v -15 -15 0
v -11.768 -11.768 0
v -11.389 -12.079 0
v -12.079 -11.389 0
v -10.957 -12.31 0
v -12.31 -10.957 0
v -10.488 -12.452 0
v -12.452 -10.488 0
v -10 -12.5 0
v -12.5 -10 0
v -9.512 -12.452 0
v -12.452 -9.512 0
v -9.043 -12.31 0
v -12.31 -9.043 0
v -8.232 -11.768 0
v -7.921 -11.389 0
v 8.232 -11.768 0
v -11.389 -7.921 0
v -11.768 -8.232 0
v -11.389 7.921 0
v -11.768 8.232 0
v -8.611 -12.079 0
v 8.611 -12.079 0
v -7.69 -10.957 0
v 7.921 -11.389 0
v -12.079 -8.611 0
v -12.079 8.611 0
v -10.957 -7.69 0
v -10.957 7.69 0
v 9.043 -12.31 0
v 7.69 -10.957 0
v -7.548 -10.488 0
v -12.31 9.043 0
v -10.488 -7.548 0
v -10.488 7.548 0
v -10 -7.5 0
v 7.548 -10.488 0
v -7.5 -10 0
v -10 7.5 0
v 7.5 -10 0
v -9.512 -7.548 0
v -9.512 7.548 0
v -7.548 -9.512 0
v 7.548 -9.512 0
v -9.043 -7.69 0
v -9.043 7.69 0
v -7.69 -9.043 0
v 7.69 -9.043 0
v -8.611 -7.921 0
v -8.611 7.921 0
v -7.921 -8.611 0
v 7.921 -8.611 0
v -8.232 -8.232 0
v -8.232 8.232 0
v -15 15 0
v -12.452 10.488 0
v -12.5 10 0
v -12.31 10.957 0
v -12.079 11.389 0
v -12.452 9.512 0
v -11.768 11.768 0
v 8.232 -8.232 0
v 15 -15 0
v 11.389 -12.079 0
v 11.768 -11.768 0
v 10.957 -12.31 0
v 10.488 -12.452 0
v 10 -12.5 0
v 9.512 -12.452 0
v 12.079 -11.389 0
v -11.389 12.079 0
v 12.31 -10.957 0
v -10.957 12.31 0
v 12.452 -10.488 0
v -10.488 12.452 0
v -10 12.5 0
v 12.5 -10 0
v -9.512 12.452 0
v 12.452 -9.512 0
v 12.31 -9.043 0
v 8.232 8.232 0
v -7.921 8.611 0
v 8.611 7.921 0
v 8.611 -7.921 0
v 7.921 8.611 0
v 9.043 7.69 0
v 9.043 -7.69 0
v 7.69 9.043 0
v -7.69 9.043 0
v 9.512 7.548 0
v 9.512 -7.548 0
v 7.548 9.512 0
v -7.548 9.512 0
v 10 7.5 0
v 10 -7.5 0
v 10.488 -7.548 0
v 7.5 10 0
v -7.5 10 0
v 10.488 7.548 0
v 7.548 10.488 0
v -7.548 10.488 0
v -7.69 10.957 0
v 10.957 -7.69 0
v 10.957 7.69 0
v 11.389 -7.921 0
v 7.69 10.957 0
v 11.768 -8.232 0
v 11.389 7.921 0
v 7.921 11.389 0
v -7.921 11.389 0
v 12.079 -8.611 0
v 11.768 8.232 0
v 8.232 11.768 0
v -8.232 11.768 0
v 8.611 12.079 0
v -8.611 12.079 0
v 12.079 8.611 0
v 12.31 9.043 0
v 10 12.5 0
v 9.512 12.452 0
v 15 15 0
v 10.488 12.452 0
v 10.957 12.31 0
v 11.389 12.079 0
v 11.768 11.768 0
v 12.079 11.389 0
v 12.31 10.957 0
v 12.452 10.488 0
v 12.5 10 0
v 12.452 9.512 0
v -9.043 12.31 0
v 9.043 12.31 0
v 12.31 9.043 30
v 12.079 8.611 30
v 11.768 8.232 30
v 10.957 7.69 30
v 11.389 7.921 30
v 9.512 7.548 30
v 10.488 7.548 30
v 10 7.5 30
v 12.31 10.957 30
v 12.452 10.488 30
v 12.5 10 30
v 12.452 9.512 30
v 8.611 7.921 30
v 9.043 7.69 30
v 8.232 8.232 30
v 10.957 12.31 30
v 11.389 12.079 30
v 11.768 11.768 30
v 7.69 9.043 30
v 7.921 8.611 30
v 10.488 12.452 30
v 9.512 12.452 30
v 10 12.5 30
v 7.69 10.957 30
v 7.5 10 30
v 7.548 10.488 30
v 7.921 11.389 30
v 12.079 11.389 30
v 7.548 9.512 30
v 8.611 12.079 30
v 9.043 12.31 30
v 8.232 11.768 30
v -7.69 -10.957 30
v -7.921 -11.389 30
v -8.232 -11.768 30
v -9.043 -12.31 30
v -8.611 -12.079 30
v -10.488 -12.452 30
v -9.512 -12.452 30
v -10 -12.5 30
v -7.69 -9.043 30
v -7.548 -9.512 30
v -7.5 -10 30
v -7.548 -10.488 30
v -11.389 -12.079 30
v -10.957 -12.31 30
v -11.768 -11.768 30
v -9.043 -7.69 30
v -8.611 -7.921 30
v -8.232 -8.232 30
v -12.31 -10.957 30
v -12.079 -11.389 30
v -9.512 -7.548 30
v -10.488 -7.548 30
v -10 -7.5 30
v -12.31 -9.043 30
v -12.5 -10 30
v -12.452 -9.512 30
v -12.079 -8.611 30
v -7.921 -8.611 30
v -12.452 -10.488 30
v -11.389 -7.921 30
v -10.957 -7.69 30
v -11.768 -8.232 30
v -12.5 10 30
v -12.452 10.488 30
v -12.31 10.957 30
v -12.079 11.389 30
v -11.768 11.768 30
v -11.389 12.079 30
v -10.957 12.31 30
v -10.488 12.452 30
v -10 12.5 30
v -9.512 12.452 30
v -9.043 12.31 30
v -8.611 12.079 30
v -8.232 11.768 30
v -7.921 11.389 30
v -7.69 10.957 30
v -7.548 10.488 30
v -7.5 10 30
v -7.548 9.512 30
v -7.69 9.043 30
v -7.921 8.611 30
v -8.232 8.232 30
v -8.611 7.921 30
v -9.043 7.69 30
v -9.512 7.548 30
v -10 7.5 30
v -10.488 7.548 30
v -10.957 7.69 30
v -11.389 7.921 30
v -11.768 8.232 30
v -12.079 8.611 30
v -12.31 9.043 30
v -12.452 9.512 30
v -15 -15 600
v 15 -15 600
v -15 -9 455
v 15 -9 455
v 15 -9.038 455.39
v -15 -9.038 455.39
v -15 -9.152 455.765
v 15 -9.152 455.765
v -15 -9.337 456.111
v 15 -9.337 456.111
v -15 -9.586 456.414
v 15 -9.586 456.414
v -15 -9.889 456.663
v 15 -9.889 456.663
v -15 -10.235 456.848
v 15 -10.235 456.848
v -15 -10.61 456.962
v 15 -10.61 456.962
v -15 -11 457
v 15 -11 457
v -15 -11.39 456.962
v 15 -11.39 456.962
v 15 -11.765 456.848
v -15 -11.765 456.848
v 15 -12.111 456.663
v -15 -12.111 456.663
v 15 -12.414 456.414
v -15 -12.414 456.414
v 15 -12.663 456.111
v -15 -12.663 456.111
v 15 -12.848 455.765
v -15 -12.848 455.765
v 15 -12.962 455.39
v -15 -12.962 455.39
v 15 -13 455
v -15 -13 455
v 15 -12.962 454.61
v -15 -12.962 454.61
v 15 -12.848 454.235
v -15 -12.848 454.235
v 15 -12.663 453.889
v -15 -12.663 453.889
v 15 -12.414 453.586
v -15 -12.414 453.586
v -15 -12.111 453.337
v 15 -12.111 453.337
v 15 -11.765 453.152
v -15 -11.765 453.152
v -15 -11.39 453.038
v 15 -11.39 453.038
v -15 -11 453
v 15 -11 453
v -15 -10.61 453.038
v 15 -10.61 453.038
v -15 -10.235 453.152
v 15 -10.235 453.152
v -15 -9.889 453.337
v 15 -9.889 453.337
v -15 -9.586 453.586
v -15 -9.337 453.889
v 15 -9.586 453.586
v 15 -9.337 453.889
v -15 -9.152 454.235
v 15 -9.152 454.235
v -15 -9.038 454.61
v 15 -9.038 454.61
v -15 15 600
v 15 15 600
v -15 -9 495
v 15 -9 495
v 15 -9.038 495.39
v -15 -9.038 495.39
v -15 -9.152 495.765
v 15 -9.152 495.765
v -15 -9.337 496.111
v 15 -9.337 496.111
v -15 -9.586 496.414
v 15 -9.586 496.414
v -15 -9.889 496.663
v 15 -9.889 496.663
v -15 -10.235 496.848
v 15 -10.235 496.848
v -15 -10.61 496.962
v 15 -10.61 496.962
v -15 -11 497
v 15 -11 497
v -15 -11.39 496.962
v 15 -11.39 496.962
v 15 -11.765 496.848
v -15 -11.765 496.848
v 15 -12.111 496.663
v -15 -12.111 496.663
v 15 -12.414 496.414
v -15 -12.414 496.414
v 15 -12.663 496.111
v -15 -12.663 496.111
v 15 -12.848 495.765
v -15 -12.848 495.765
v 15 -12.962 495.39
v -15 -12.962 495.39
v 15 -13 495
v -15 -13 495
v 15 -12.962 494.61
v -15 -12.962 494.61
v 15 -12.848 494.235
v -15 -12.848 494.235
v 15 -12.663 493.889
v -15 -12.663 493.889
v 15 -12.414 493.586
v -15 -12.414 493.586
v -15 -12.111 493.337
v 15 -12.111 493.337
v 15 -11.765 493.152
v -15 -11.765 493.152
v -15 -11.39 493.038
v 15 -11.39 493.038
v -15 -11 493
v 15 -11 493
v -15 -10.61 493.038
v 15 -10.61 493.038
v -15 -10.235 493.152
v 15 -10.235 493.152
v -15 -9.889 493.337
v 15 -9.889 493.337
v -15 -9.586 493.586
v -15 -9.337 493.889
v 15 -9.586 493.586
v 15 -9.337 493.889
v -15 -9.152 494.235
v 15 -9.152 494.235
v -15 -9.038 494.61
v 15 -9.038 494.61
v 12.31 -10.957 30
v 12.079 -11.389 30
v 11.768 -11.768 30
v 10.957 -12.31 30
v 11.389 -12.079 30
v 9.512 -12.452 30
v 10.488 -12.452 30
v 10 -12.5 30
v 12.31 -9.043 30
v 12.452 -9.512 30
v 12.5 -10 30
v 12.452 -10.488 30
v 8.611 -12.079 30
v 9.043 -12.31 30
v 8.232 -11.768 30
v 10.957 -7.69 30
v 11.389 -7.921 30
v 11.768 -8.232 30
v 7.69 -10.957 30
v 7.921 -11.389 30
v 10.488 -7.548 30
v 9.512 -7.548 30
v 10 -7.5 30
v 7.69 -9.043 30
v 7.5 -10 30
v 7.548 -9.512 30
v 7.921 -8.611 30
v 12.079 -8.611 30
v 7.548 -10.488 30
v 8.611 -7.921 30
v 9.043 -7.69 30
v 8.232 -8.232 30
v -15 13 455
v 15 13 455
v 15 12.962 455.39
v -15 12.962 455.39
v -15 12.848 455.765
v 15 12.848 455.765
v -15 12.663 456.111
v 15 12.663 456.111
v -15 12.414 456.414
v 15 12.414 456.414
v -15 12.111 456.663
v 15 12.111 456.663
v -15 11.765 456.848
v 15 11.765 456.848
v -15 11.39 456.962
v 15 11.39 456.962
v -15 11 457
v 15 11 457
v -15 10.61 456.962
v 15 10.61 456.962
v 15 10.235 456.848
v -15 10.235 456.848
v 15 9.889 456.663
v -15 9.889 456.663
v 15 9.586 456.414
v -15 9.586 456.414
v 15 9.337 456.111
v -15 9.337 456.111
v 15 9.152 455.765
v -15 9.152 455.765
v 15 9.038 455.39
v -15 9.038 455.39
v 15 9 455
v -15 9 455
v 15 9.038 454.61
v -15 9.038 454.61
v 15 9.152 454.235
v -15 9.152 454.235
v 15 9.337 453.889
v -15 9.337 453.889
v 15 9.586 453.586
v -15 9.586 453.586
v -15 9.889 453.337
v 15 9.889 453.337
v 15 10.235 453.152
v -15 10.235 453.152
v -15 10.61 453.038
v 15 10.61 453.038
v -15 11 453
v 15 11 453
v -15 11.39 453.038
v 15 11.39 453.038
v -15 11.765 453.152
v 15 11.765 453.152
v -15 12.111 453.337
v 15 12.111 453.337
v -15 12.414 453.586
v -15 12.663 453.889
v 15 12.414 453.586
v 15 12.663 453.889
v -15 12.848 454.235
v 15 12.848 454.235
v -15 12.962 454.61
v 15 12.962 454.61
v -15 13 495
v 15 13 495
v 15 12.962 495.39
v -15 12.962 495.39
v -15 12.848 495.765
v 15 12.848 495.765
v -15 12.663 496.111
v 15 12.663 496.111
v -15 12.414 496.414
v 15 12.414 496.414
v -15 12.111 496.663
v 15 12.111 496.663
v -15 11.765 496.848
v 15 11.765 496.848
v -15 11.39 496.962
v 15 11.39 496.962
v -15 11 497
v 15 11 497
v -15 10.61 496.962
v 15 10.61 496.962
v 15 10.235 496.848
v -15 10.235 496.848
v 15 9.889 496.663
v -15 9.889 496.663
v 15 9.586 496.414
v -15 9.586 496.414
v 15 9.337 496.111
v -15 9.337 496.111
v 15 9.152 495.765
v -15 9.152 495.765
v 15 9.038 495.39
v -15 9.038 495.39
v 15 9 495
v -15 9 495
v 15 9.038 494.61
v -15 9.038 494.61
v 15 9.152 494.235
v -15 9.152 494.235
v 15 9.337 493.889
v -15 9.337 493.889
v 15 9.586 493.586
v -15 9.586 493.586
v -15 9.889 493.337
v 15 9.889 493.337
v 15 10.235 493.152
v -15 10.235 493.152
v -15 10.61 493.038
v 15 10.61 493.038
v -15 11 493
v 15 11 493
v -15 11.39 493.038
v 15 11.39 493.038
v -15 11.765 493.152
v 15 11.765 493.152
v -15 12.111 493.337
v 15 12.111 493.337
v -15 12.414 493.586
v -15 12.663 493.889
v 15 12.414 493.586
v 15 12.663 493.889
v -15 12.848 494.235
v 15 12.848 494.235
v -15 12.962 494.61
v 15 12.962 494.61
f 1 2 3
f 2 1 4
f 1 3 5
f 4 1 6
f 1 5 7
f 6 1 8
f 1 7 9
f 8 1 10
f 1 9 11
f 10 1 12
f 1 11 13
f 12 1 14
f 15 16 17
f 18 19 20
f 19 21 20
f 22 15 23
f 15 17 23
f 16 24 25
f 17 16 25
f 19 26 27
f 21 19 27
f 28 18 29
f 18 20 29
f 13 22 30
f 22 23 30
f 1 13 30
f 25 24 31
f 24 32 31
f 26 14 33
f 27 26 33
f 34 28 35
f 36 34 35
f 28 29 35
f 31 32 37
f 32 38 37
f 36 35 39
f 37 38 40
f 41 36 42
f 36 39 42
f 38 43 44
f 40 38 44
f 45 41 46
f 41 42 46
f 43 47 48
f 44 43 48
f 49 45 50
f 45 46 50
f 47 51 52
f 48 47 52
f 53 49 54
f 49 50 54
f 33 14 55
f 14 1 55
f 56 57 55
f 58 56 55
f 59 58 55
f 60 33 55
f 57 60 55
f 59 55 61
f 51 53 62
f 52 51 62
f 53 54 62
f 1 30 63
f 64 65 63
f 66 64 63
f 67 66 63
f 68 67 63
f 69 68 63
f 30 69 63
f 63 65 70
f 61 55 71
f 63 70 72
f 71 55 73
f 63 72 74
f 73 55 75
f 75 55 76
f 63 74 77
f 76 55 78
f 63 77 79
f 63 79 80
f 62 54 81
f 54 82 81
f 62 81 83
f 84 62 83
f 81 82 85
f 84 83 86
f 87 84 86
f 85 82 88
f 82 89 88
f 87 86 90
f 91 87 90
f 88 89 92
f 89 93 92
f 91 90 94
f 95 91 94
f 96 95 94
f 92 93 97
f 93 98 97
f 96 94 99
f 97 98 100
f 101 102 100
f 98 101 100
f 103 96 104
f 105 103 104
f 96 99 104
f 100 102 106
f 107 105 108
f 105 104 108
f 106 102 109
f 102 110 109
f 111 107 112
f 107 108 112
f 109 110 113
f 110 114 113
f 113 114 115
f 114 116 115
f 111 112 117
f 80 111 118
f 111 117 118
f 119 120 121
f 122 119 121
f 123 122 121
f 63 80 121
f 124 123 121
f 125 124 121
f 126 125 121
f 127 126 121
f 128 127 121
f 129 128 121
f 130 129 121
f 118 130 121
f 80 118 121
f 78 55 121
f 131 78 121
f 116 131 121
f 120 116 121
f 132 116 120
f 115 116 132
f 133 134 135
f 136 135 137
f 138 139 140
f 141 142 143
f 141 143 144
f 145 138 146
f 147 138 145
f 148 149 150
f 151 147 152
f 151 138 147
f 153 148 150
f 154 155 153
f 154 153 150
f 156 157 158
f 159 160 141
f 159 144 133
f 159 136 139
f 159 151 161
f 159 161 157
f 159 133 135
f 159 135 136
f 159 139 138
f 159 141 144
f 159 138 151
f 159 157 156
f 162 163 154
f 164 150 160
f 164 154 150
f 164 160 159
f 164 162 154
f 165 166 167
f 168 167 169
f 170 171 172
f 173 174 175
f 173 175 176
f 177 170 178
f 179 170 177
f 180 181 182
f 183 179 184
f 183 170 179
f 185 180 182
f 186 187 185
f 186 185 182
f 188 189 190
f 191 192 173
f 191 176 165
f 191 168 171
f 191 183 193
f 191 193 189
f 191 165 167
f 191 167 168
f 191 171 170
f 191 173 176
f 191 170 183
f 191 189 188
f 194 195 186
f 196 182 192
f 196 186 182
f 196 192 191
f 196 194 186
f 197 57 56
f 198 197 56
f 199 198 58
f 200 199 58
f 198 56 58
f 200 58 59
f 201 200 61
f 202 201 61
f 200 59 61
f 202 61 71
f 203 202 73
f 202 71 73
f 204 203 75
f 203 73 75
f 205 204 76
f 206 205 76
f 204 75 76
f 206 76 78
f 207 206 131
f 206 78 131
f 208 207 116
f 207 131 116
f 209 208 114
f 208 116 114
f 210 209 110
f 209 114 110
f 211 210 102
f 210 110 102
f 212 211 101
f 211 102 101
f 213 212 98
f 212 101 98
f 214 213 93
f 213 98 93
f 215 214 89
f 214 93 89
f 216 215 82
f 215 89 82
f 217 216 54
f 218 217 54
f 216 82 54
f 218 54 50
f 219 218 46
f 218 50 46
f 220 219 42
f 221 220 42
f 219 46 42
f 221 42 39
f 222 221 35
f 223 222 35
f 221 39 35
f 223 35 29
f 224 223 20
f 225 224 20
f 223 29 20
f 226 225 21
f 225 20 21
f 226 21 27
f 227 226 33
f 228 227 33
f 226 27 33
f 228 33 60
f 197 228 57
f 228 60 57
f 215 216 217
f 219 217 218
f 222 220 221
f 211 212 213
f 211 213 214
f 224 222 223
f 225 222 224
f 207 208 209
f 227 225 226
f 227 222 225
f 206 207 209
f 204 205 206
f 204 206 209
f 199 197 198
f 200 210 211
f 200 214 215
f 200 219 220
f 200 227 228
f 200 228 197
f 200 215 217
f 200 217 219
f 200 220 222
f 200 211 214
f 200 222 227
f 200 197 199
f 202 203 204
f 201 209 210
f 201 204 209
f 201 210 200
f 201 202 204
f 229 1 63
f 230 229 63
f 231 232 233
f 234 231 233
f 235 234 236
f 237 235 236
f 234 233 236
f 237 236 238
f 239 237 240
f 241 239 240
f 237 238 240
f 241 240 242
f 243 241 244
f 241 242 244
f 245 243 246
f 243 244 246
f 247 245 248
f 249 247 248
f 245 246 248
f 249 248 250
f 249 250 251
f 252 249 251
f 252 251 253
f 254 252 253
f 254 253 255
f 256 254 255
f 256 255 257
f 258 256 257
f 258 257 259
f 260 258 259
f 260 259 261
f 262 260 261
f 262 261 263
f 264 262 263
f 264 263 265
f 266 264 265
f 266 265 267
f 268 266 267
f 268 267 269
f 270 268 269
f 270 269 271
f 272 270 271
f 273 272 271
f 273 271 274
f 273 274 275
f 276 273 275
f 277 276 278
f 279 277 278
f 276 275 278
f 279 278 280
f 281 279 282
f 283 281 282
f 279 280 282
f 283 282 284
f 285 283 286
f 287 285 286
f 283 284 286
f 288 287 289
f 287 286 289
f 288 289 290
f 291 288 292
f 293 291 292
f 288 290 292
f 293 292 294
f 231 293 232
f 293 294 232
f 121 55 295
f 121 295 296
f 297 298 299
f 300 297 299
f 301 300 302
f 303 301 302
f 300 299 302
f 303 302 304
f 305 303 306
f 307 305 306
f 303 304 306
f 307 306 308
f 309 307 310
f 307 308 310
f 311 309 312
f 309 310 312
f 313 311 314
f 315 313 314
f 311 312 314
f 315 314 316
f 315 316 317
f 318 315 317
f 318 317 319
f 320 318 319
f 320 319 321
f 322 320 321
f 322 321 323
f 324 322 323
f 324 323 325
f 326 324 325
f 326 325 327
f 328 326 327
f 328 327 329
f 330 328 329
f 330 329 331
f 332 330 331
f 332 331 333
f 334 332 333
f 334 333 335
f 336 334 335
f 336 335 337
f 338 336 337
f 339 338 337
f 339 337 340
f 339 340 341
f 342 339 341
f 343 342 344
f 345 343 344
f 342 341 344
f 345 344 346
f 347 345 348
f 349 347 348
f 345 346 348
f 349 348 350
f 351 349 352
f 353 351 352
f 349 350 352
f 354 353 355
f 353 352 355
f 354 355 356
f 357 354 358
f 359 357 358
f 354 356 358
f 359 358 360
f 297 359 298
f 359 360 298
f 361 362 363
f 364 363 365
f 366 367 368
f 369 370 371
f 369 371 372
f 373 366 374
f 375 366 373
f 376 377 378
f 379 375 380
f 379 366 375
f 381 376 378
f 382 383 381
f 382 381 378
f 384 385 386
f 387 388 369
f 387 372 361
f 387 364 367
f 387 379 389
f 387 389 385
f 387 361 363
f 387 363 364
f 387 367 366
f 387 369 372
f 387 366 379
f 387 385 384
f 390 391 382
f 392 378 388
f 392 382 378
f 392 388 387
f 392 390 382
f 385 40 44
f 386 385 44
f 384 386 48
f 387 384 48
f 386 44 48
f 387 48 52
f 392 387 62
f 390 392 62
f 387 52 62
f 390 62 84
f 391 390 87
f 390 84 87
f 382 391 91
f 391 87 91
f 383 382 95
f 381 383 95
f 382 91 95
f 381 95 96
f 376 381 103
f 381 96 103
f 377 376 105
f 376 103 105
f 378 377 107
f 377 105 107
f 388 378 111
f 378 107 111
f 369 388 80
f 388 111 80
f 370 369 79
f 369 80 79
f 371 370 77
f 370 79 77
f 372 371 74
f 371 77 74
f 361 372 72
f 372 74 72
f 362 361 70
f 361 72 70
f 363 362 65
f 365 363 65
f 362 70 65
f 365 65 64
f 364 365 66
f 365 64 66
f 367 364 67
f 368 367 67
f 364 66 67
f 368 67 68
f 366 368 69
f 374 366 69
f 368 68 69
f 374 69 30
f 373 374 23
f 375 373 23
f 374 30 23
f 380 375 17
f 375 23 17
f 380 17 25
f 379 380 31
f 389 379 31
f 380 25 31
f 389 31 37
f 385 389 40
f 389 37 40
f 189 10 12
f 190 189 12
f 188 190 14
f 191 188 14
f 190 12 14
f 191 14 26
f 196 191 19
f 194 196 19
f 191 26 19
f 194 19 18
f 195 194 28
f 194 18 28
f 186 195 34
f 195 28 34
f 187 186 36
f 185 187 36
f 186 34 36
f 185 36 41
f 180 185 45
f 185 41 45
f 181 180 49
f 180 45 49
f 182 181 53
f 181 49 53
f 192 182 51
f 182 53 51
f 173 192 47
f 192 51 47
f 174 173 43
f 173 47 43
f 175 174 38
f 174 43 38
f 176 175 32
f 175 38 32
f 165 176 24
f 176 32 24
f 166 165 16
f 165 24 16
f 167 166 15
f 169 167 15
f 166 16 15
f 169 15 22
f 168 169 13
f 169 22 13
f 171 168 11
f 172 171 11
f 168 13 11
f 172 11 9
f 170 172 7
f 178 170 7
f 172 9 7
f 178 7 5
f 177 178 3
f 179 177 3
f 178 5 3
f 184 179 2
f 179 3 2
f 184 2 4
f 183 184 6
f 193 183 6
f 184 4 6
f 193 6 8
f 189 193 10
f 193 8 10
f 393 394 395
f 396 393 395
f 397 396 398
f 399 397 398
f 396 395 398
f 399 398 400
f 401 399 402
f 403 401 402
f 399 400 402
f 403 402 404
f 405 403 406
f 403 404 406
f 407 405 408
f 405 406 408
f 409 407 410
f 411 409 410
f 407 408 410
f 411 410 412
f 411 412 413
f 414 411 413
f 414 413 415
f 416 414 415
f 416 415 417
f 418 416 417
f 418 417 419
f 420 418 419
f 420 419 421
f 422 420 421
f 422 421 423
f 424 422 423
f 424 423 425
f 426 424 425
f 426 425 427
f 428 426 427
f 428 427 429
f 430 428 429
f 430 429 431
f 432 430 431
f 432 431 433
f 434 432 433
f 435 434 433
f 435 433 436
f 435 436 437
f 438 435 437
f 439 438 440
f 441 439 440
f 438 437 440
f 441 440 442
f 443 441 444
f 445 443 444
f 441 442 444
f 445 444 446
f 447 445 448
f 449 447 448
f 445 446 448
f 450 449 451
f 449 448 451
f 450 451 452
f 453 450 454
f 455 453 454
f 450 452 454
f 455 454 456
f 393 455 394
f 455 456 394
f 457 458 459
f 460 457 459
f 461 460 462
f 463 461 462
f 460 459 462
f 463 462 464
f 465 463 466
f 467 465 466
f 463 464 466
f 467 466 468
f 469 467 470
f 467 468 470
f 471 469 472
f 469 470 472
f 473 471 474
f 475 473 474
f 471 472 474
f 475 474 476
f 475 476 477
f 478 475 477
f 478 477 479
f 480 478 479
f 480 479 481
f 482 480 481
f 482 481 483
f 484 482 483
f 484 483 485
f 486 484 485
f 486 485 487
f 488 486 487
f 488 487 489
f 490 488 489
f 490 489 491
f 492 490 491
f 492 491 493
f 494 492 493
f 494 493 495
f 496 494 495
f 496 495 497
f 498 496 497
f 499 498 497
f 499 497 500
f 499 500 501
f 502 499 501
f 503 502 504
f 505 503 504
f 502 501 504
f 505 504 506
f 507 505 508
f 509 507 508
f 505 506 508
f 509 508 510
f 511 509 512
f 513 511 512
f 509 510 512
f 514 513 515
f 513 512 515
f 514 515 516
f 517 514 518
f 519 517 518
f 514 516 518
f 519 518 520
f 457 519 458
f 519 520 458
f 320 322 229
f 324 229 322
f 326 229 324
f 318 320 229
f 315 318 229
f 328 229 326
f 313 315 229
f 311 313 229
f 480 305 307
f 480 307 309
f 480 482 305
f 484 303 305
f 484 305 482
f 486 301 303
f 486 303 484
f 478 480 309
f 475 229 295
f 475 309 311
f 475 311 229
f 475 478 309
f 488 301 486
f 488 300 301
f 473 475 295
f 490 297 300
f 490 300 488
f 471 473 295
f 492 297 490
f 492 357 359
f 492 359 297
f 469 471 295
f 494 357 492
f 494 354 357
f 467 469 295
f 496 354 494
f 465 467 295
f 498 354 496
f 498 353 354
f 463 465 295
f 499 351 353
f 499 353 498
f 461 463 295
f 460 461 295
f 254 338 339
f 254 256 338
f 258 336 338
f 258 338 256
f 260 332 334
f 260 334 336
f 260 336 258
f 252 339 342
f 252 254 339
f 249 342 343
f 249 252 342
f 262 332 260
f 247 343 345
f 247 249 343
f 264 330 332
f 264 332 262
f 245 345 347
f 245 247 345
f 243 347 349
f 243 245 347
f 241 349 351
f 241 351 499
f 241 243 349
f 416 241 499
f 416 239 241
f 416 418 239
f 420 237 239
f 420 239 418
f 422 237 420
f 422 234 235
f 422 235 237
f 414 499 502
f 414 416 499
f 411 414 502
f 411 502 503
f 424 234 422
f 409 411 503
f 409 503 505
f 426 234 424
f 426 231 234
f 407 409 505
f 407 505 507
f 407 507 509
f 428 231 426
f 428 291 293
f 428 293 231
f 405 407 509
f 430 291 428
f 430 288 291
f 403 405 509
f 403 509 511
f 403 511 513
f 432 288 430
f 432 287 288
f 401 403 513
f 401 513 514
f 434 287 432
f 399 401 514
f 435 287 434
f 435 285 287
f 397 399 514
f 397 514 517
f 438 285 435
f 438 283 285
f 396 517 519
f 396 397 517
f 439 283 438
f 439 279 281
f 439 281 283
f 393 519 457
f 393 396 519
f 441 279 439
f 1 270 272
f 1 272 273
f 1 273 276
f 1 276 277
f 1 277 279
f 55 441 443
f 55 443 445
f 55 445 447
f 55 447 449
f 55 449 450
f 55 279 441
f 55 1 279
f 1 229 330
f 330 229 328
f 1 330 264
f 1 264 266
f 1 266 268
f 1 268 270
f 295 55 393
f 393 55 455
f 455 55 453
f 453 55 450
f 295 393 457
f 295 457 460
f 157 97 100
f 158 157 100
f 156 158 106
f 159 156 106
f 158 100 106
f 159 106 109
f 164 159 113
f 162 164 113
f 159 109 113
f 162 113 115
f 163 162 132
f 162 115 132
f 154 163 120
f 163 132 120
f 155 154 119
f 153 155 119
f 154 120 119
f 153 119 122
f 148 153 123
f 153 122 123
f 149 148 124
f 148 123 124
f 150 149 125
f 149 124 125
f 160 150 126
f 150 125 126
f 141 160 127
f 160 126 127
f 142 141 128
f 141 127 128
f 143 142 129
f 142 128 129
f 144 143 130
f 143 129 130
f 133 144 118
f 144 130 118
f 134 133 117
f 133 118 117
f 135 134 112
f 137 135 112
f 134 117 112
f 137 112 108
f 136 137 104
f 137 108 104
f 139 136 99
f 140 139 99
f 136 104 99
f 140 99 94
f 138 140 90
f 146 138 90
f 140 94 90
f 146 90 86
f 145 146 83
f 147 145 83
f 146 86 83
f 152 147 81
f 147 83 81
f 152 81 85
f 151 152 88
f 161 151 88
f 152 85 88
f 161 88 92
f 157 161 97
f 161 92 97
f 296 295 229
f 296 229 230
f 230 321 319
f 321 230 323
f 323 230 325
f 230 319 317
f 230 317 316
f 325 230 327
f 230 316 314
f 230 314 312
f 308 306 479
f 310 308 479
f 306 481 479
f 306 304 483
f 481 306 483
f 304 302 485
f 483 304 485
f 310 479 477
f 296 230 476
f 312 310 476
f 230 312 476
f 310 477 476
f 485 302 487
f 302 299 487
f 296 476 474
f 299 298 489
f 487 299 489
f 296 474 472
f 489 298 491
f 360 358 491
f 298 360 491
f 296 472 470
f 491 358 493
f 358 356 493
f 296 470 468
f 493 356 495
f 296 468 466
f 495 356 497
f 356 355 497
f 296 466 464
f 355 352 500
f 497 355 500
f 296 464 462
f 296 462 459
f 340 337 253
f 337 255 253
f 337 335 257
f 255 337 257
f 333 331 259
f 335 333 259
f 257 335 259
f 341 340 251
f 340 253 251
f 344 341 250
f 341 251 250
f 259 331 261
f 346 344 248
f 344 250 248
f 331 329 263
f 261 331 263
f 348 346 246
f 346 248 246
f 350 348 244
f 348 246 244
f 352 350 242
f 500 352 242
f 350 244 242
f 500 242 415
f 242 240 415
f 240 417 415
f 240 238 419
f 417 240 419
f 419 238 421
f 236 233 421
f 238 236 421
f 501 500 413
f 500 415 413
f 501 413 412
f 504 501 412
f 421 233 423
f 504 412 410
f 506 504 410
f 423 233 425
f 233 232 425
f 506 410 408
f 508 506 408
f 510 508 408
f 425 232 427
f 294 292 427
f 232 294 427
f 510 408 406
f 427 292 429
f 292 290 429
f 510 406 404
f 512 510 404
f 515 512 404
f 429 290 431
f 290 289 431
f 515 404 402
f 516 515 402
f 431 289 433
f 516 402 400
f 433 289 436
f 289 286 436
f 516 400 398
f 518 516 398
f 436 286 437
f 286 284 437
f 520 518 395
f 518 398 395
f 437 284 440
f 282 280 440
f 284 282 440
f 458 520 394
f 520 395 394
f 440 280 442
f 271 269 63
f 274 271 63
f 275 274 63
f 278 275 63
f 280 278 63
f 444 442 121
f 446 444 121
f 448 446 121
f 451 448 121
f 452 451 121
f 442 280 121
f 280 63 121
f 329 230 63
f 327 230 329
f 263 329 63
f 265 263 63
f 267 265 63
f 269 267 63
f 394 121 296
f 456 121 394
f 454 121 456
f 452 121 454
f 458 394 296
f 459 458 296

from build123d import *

# Parameters (mm, degrees)
SKETCH1_W             = 30
SKETCH1_H             = 30
BOSS_EXTRUDE1_DEPTH   = 600
SKETCH8_R             = 2.5
CUT_EXTRUDE7_DEPTH    = 30
F_4_0MM_DOWEL_HOLE1_D = 4


with BuildPart() as part:
    # Sketch1 → Boss-Extrude1 (new body)
    with BuildSketch(Plane.XY):
        Rectangle(SKETCH1_W, SKETCH1_H)
    extrude(amount=BOSS_EXTRUDE1_DEPTH)

    # Sketch8 → Cut-Extrude7 (cut)
    with BuildSketch(Plane(origin=(0, 0, 0), x_dir=(-1, 0, 0), z_dir=(0, 0, -1))):
        with Locations((-10, 10)):
            Circle(SKETCH8_R)
        with Locations((10, 10)):
            Circle(SKETCH8_R)
        with Locations((10, -10)):
            Circle(SKETCH8_R)
        with Locations((-10, -10)):
            Circle(SKETCH8_R)
    extrude(amount=-CUT_EXTRUDE7_DEPTH, mode=Mode.SUBTRACT)

    # Ø4.0mm Dowel Hole1 (through all)
    with Locations(Plane(origin=(-15, 11, 495), x_dir=(0, -1, 0), z_dir=(-1, 0, 0))):
        with Locations((0, 0), (0, -40), (22, -40), (22, 0)):
            Hole(F_4_0MM_DOWEL_HOLE1_D / 2)


solid = part.part
